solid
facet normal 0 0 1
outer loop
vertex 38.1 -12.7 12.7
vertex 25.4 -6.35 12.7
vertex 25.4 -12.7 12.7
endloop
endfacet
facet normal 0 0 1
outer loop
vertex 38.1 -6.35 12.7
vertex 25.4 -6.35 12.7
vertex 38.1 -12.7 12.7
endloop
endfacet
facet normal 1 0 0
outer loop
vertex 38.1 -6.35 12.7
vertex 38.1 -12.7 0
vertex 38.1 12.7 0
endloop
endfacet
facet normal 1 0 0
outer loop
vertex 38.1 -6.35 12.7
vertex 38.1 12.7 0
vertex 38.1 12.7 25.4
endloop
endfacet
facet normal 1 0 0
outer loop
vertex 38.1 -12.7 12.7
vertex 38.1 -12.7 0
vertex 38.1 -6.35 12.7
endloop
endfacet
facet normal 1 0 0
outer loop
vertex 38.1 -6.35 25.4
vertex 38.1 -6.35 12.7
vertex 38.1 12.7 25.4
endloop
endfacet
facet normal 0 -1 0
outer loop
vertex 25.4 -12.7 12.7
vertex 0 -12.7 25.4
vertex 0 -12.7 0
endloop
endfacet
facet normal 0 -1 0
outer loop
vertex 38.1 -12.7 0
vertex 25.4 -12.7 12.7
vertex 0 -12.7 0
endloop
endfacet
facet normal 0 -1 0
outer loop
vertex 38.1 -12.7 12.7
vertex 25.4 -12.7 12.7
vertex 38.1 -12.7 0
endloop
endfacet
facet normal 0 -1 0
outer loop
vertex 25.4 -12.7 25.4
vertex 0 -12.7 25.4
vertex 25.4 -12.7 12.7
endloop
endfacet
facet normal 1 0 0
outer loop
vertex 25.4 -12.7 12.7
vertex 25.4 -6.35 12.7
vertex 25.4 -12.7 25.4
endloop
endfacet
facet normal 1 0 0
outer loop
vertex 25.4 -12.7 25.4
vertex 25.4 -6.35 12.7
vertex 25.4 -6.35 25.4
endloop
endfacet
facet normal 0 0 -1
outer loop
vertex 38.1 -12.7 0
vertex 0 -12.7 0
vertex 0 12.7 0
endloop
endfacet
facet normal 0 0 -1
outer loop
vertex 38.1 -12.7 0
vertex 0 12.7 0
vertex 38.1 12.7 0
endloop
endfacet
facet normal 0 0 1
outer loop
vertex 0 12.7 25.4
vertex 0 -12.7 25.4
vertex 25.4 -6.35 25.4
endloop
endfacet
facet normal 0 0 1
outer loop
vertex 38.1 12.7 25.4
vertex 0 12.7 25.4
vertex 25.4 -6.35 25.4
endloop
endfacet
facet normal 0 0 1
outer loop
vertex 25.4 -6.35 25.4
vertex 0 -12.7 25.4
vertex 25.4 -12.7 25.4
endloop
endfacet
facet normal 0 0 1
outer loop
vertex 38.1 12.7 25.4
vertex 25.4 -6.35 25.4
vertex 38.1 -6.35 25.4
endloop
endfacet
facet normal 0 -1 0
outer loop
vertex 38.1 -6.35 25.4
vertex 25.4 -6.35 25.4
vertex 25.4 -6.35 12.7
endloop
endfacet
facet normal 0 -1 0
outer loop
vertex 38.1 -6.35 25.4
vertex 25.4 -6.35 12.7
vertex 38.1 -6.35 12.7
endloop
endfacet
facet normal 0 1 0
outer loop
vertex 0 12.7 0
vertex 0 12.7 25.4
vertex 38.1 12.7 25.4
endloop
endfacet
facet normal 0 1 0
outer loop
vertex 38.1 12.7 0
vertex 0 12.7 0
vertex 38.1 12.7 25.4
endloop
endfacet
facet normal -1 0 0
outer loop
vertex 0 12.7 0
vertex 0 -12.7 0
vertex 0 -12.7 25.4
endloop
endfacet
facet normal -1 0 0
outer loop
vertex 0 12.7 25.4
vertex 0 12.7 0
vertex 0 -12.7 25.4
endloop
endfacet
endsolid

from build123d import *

# Parameters (mm, degrees)
F0_W     = 38.1
F0_H     = 25.4
F1_DEPTH = 12.7
F3_START = 6.35
F2_W     = 12.7
F2_H     = 12.7
F3_DEPTH = 19.05
F4_W     = 12.7
F4_H     = 6.35
F5_DEPTH = 25.4


with BuildPart() as f1:
    # F0 (on Front) → F1 (new body, symmetric)
    with BuildSketch(Plane.XZ):
        with Locations((19.05, 12.7)):
            Rectangle(F0_W, F0_H)
    extrude(amount=F1_DEPTH, both=True)

    # F2 (on Front) → F3 (cut)
    with BuildSketch(Plane.XZ.offset(F3_START)):
        with Locations((31.75, 19.05)):
            Rectangle(F2_W, F2_H)
    extrude(amount=F3_DEPTH, mode=Mode.SUBTRACT)

    # F4 (on Top) → F5 (cut)
    with BuildSketch(Plane.XY):
        with Locations((6.35, 9.525)):
            Rectangle(F4_W, F4_H)
    extrude(amount=-F5_DEPTH, mode=Mode.SUBTRACT)


solid = f1.part
